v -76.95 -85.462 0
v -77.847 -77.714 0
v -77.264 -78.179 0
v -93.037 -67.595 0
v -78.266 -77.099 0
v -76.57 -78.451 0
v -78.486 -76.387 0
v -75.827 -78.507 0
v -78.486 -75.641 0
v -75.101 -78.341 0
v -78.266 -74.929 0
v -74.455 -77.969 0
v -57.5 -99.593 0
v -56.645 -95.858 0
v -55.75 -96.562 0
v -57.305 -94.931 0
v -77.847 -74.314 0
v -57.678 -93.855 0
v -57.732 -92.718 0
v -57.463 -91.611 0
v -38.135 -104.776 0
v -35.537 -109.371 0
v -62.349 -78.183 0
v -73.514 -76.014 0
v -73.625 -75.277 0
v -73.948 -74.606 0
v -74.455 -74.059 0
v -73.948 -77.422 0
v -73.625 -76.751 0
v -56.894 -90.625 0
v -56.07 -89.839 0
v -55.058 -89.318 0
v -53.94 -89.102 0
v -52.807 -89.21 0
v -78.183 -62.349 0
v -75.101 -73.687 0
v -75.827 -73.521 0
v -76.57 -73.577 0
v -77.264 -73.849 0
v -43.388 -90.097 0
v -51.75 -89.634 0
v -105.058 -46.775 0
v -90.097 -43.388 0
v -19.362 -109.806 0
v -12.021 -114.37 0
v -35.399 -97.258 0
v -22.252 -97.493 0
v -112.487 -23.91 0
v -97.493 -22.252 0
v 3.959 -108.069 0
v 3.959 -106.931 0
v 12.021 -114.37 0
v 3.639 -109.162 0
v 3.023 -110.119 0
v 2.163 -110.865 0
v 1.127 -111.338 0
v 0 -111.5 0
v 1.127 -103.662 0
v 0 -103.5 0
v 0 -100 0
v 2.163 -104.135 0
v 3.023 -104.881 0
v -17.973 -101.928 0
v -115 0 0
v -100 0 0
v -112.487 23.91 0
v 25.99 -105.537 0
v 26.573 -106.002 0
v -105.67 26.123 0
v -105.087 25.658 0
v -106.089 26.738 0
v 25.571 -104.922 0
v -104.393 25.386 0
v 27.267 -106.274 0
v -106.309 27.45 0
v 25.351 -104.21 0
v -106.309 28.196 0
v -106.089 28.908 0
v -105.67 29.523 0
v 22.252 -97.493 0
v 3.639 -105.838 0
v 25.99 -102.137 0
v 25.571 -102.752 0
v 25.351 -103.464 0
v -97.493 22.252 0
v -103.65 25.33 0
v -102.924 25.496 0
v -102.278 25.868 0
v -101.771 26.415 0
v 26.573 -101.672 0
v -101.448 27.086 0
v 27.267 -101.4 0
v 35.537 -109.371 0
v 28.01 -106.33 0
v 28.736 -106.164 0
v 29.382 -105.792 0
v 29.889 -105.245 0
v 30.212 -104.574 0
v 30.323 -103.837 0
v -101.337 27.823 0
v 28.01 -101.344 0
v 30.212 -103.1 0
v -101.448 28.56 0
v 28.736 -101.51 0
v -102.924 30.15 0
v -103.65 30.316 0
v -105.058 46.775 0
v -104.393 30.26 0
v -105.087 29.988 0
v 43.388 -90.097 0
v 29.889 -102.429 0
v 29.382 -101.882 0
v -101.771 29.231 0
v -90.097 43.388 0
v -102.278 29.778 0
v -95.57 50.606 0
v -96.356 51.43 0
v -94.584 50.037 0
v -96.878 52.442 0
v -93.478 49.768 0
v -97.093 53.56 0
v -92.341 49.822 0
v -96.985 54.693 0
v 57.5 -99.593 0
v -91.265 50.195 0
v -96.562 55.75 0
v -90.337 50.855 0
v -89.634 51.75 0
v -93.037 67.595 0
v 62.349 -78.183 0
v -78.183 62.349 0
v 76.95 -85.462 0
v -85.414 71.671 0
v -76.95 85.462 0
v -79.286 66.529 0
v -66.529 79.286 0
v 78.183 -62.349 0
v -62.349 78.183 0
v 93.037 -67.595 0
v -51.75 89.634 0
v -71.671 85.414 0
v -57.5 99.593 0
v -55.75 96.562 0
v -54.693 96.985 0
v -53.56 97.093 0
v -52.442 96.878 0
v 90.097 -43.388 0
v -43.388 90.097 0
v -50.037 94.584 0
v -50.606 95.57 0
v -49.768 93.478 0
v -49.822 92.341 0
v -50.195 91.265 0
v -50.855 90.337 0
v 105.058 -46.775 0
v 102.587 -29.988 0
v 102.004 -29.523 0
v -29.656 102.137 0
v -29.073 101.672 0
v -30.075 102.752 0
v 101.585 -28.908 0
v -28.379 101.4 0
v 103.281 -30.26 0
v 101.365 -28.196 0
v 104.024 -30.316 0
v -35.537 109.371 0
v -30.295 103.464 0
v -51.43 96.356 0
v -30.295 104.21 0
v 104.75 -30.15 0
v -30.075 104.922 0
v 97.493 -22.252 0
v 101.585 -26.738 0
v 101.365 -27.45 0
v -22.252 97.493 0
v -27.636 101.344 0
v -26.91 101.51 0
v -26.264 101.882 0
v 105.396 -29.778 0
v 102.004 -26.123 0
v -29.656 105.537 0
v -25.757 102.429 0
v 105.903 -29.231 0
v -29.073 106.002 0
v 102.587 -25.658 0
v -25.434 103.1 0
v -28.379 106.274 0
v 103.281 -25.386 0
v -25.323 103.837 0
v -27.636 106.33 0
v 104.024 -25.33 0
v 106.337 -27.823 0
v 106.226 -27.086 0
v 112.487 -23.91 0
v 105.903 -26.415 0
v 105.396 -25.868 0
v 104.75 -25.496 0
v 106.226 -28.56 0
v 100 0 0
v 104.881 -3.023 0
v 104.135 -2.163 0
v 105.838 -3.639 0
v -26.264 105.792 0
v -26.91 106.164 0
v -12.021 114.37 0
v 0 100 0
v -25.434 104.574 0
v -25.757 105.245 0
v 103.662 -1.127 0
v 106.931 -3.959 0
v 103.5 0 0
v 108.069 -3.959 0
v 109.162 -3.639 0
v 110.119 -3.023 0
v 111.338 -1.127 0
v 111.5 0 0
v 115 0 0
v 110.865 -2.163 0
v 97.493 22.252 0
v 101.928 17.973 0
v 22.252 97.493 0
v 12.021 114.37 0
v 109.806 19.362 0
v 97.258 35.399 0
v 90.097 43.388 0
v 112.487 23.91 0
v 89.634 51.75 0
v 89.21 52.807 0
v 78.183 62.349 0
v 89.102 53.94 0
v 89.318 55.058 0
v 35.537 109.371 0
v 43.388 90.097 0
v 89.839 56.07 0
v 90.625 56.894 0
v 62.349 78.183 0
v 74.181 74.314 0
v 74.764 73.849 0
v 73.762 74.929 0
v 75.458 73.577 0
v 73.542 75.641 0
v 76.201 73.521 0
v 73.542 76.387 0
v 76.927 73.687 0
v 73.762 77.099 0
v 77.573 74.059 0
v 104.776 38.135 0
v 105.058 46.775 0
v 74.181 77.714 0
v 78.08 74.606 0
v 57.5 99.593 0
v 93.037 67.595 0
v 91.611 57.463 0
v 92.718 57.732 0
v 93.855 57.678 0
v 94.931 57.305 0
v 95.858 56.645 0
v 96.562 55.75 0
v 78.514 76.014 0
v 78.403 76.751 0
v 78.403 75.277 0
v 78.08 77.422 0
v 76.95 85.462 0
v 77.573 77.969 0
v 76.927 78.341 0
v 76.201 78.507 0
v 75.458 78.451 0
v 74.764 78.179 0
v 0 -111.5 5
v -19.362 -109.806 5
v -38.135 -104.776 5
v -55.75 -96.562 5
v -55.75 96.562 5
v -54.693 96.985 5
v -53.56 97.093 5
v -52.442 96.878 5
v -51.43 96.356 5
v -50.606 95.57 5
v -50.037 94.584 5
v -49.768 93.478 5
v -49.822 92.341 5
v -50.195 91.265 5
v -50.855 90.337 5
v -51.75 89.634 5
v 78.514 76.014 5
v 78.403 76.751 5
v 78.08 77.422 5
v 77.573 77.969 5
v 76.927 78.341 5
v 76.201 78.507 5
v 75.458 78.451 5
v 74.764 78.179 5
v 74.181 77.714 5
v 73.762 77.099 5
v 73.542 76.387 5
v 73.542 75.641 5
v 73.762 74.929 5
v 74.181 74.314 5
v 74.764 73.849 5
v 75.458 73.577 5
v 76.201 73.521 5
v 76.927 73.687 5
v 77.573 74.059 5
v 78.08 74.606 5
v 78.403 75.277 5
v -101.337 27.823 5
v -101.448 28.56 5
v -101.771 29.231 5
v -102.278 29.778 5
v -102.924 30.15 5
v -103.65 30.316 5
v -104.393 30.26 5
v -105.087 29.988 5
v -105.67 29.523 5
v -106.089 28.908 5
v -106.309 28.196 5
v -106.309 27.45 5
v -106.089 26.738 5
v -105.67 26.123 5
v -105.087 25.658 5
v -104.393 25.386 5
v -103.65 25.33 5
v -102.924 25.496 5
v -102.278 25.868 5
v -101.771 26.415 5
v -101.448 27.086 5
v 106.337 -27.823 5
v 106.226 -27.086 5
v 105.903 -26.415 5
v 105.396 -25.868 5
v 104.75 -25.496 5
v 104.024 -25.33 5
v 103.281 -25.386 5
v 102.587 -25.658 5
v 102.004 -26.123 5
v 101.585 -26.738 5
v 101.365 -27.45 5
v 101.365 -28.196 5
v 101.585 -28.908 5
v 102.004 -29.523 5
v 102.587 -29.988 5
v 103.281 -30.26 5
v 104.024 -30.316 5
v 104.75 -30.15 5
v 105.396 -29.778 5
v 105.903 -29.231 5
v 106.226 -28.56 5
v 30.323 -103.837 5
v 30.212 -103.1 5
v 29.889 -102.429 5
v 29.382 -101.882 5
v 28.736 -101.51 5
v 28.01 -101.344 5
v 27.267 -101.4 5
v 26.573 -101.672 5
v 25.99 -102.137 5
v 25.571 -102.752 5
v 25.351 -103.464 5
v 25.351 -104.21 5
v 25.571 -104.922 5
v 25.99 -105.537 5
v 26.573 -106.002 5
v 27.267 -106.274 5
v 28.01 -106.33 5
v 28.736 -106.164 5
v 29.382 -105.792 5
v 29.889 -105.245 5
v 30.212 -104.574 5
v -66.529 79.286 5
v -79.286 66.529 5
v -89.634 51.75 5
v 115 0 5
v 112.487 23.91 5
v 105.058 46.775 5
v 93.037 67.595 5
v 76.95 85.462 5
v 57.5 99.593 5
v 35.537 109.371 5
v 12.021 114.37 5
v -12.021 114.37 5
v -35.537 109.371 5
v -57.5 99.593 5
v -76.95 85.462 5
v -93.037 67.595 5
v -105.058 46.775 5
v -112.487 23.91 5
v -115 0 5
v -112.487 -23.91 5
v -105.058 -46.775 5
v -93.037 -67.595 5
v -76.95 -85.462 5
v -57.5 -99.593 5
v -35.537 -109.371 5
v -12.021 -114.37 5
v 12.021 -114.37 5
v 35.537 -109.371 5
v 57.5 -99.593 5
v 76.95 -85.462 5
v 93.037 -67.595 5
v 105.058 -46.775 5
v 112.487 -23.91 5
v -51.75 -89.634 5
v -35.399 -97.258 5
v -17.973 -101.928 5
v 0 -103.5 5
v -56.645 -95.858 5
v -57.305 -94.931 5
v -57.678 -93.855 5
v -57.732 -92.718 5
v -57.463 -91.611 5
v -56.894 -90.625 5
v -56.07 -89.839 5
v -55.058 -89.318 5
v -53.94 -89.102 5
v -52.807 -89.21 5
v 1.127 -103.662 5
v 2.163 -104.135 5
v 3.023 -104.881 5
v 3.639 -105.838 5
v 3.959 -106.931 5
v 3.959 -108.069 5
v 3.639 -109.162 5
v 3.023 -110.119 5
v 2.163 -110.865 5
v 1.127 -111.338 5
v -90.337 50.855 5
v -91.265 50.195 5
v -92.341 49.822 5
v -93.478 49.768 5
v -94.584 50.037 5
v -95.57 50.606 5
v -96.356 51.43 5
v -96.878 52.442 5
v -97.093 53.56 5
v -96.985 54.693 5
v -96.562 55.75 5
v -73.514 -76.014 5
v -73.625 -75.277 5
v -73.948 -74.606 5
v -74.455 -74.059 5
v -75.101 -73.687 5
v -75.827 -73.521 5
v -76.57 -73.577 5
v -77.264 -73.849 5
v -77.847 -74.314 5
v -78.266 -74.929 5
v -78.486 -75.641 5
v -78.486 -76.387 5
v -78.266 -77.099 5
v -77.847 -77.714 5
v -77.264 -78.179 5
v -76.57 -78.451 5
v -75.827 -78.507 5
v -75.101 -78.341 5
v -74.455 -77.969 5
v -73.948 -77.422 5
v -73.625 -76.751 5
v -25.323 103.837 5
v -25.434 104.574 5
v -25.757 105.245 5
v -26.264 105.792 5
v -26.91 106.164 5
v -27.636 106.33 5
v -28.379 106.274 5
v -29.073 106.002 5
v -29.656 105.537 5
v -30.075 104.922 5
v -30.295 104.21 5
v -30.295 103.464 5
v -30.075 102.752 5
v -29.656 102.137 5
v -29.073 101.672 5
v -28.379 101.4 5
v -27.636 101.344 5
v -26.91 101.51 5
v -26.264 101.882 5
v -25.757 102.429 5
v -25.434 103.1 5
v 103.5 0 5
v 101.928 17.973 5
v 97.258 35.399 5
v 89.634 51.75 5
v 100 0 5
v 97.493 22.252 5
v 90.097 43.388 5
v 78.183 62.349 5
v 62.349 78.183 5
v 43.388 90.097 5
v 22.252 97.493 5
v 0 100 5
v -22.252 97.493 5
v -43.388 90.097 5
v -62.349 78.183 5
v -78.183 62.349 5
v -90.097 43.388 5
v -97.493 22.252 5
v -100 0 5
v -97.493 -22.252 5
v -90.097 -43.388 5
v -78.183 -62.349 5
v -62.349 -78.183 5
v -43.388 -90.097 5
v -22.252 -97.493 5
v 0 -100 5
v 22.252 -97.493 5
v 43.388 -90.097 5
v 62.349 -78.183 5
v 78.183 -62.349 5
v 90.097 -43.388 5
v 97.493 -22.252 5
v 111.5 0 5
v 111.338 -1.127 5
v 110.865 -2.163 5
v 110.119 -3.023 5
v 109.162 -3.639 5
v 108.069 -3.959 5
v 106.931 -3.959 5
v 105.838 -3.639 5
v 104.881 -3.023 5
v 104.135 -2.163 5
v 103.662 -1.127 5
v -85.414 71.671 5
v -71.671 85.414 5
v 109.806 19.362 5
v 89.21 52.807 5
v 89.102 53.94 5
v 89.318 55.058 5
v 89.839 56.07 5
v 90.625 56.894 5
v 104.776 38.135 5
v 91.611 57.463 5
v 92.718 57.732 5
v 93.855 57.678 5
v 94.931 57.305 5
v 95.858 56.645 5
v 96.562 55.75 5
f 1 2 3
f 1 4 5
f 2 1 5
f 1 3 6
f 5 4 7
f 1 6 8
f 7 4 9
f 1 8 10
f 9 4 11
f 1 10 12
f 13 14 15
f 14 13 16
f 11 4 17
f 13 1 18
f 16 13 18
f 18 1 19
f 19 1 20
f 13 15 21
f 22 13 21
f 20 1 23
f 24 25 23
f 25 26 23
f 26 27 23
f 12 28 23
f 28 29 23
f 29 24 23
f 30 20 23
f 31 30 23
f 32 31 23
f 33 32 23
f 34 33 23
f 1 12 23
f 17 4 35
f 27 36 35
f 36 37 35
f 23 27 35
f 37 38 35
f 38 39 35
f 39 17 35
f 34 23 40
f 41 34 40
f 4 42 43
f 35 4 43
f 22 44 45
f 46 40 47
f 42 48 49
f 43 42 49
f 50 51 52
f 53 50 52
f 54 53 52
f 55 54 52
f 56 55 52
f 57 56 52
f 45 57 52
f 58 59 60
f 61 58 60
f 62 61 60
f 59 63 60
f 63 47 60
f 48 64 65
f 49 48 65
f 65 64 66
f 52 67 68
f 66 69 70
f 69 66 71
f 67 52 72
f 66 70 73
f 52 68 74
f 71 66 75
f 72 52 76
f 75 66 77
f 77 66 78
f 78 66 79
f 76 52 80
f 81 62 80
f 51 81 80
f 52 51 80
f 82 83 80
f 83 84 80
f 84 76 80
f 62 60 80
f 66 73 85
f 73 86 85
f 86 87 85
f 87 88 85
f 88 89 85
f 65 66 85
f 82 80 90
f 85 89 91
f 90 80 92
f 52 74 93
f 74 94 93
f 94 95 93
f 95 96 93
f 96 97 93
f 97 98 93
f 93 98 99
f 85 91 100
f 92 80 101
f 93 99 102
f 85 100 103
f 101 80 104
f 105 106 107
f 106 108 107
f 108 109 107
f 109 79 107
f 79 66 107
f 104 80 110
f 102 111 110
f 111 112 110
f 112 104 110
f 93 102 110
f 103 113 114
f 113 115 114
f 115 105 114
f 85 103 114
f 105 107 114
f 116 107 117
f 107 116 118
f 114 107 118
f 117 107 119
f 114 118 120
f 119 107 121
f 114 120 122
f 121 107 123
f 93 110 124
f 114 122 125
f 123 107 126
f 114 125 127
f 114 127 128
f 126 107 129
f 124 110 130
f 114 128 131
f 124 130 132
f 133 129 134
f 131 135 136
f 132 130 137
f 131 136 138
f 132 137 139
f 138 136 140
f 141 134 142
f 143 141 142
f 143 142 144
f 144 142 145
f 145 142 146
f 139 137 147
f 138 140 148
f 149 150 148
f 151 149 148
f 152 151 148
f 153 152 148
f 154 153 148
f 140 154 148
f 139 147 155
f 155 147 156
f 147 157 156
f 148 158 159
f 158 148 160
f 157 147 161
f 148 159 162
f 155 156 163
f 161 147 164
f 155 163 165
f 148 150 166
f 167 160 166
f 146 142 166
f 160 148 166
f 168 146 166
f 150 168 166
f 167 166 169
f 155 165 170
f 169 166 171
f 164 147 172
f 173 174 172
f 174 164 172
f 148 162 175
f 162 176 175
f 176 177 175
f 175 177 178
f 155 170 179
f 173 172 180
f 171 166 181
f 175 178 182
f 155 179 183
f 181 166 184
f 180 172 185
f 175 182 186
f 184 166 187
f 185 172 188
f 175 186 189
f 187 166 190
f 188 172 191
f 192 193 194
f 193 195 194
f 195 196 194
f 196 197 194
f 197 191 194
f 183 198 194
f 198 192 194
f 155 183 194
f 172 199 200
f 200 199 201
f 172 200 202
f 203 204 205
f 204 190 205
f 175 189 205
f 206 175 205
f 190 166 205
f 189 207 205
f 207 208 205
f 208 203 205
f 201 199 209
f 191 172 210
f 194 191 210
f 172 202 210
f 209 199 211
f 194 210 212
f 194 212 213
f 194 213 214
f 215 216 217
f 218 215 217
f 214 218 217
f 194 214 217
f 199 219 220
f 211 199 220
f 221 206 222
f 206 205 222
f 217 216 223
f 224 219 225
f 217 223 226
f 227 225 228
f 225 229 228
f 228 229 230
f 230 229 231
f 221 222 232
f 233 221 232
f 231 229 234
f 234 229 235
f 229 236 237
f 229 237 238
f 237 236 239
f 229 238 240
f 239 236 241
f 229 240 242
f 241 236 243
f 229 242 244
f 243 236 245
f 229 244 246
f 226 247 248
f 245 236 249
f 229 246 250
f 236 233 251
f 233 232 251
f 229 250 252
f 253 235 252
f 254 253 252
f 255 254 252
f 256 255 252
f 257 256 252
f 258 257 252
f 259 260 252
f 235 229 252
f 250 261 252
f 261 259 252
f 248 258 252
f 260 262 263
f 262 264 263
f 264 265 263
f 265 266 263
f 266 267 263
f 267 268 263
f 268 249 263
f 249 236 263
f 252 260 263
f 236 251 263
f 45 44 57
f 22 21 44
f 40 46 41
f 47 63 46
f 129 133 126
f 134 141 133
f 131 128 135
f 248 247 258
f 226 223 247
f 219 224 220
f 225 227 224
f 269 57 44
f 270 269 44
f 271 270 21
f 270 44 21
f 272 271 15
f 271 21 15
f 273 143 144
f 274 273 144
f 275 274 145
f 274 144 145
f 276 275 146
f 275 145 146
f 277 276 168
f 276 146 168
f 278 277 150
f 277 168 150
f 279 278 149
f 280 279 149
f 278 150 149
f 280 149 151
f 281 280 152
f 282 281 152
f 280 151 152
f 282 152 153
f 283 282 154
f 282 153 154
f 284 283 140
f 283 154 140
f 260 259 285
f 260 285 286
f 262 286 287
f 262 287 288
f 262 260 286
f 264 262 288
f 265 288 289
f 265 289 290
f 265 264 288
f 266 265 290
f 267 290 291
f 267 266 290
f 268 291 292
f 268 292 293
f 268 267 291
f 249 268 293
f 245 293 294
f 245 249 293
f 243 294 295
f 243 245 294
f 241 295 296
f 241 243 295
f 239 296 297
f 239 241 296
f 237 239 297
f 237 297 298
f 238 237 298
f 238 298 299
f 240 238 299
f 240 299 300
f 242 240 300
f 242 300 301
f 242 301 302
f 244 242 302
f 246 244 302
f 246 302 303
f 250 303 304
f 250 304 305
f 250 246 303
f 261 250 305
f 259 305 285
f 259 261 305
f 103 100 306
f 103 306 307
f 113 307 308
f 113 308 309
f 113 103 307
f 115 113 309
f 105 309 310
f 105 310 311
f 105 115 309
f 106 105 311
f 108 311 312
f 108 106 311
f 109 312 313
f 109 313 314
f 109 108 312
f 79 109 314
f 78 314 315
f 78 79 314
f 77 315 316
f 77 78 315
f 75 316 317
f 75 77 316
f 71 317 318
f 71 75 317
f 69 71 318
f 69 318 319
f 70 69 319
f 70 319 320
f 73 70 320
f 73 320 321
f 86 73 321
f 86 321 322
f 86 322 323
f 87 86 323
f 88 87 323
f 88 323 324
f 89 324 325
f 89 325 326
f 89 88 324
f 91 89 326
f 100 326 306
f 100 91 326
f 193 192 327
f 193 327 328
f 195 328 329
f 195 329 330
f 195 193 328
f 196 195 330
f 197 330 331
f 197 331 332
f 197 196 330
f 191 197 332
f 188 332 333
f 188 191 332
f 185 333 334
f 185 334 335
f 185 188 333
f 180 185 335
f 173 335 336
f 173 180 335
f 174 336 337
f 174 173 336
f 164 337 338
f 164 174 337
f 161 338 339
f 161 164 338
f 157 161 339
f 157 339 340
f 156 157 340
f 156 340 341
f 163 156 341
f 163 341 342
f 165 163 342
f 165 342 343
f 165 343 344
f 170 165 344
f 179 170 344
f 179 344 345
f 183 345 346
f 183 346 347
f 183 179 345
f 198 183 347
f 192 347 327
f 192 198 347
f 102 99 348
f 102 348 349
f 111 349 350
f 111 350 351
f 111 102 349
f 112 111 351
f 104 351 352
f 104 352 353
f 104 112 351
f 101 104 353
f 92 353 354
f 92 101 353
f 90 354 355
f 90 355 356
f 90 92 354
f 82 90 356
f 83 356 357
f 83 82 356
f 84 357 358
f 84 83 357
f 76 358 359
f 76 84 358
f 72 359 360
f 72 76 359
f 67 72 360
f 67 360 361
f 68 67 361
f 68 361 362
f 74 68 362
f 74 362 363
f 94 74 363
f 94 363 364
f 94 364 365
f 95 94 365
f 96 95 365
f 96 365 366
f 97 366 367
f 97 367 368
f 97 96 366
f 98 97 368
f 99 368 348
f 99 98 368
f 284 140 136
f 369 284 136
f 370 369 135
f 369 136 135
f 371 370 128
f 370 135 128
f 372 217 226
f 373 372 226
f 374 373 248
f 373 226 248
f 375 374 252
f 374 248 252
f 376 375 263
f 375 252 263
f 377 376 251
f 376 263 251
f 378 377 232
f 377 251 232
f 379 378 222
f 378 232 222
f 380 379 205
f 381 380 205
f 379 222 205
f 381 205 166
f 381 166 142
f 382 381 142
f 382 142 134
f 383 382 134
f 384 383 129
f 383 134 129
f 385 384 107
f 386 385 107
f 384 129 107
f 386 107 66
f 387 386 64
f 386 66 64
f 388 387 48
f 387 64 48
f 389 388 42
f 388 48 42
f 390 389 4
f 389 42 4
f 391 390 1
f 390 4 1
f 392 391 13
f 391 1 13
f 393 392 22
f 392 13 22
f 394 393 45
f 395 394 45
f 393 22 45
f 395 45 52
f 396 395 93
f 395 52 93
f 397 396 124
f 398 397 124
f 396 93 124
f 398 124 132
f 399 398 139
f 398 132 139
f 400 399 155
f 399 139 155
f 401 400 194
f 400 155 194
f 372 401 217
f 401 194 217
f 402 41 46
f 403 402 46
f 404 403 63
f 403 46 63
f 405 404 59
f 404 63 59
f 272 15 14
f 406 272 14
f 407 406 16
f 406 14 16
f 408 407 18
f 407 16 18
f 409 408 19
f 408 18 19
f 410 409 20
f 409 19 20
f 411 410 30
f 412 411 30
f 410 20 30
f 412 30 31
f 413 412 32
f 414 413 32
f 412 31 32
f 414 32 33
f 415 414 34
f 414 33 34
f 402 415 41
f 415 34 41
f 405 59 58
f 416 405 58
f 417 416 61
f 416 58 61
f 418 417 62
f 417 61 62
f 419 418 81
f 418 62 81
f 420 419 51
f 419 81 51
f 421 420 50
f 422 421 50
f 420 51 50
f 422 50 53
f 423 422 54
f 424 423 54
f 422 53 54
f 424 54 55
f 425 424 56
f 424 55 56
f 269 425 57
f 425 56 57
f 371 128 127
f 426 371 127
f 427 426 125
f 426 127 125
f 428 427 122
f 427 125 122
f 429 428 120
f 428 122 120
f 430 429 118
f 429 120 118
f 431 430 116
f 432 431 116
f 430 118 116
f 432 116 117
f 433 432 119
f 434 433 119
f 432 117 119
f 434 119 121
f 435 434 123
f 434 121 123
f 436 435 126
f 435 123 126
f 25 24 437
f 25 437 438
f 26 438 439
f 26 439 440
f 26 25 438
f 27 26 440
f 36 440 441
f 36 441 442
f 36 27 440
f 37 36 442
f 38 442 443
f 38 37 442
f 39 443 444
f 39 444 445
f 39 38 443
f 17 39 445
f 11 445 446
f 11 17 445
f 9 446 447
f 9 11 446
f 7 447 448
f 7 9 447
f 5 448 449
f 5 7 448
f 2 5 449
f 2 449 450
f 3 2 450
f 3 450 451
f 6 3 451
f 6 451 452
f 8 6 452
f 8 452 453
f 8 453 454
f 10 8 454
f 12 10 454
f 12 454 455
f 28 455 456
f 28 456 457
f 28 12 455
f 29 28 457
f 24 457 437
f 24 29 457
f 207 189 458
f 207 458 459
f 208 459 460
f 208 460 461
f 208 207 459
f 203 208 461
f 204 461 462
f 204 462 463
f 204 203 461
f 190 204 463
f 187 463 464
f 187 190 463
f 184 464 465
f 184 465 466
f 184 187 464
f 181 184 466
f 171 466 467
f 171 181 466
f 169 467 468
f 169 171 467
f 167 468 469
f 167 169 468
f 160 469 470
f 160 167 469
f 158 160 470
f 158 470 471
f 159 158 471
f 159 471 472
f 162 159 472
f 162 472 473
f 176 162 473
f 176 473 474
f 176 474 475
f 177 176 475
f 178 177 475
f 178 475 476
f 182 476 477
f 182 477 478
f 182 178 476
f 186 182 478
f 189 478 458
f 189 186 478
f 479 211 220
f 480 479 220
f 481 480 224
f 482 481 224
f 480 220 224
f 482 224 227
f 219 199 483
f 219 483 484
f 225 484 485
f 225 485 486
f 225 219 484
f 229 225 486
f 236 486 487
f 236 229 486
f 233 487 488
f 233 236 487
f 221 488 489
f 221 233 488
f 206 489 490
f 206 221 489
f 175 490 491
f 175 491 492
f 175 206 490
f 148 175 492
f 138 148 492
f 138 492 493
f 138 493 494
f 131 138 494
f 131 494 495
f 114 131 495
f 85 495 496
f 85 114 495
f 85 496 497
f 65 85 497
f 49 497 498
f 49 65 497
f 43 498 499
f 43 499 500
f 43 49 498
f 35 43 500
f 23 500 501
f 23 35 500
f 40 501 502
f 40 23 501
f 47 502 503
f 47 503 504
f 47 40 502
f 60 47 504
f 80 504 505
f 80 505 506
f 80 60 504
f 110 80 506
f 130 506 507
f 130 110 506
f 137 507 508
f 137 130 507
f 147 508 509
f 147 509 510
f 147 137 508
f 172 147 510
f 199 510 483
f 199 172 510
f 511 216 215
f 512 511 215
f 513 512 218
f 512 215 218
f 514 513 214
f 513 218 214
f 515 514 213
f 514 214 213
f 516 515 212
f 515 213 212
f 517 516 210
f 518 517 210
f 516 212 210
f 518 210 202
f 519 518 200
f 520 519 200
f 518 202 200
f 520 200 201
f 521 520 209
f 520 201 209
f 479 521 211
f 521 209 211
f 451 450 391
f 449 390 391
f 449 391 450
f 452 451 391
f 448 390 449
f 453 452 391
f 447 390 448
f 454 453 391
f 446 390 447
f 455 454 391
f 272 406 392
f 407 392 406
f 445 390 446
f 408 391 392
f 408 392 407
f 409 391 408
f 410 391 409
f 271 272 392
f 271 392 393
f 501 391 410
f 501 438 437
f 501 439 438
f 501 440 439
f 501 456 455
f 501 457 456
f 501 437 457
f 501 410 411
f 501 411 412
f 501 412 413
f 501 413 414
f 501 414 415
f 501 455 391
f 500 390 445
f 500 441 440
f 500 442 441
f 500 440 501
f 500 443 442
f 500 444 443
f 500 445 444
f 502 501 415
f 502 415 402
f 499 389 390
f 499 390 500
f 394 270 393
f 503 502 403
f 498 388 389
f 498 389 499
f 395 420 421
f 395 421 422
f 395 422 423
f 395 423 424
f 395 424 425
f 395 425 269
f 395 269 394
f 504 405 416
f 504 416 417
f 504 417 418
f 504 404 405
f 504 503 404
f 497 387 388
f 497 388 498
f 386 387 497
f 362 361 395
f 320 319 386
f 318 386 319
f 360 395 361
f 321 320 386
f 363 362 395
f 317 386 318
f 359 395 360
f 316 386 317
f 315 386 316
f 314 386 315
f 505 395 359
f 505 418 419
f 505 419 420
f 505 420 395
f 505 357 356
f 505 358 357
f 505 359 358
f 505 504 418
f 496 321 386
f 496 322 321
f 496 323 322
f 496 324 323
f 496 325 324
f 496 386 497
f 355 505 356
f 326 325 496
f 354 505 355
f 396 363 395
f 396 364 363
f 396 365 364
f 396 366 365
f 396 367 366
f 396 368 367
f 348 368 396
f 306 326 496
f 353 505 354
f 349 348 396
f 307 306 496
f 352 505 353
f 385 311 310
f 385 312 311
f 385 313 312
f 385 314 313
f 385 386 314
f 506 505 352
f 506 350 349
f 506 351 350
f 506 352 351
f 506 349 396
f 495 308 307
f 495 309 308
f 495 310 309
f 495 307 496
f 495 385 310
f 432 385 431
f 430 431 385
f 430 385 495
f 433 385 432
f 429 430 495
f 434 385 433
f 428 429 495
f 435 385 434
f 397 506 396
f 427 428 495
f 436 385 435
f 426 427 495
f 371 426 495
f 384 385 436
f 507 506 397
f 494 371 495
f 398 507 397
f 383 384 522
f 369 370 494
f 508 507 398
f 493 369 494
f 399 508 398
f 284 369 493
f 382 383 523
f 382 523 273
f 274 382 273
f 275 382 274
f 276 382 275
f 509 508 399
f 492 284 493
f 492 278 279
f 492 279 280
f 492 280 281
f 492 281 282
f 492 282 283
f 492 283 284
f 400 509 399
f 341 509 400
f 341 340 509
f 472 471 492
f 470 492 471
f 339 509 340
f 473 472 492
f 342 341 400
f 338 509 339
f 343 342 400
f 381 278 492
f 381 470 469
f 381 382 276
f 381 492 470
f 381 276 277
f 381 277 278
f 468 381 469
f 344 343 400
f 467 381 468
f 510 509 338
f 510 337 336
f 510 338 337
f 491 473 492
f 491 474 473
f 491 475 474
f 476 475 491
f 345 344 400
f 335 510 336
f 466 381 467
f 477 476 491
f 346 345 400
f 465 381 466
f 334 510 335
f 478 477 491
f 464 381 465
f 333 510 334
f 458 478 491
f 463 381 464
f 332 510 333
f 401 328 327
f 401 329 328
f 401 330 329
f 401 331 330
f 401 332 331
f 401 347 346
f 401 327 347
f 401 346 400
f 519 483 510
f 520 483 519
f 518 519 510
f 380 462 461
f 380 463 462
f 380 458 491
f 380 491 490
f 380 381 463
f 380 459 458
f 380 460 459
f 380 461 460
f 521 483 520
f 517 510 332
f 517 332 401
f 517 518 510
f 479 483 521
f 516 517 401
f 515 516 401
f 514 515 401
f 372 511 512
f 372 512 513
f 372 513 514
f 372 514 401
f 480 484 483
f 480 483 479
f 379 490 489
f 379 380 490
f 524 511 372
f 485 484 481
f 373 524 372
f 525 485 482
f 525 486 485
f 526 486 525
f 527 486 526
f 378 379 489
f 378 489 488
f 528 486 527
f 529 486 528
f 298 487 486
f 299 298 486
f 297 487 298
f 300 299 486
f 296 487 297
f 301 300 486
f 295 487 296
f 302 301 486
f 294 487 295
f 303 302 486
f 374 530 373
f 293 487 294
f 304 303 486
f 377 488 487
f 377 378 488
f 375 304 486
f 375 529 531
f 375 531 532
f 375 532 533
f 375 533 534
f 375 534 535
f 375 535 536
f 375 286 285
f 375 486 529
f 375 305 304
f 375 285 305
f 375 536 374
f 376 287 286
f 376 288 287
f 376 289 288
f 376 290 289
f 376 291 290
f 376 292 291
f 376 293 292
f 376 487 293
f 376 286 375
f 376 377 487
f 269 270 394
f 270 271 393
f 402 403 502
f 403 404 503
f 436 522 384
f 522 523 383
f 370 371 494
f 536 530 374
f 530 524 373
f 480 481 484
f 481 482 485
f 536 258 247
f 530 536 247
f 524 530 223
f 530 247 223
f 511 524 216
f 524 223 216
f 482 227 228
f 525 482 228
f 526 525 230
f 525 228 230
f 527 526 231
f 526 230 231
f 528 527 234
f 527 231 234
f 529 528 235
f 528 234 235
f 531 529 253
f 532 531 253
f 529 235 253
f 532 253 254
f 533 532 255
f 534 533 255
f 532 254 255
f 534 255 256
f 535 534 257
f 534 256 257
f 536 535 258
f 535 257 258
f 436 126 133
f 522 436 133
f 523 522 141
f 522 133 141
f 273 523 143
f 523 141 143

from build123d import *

# Parameters (mm, degrees)
F0_R     = 115
F0_R_2   = 2.5
F0_R_3   = 100
F1_DEPTH = 5


with BuildPart() as f1:
    # F0 (on Top) → F1 (new body)
    with BuildSketch(Plane.XY):
        Circle(F0_R)
        with Locations((-76.013979, -76.013979)):
            Circle(F0_R_2, mode=Mode.SUBTRACT)
        with BuildLine():
            ThreePointArc((0, -111.5), (-28.858324, -107.70073), (-55.75, -96.561833))
            ThreePointArc((-55.75, -96.561833), (-57.214102, -91.097731), (-51.75, -89.633629))
            ThreePointArc((-51.75, -89.633629), (-26.787771, -99.973323), (0, -103.5))
            ThreePointArc((0, -103.5), (4, -107.5), (0, -111.5))
        make_face(mode=Mode.SUBTRACT)
        with Locations((27.823047, -103.837026)):
            Circle(F0_R_2, mode=Mode.SUBTRACT)
        with Locations((103.837026, -27.823047)):
            Circle(F0_R_2, mode=Mode.SUBTRACT)
        with Locations((-103.837026, 27.823047)):
            Circle(F0_R_2, mode=Mode.SUBTRACT)
        with BuildLine():
            ThreePointArc((-96.561833, 55.75), (-78.842406, 78.842406), (-55.75, 96.561833))
            ThreePointArc((-55.75, 96.561833), (-50.285898, 95.097731), (-51.75, 89.633629))
            ThreePointArc((-51.75, 89.633629), (-73.185552, 73.185552), (-89.633629, 51.75))
            ThreePointArc((-89.633629, 51.75), (-95.097731, 50.285898), (-96.561833, 55.75))
        make_face(mode=Mode.SUBTRACT)
        with Locations((-27.823047, 103.837026)):
            Circle(F0_R_2, mode=Mode.SUBTRACT)
        Circle(F0_R_3, mode=Mode.SUBTRACT)
        with BuildLine():
            ThreePointArc((111.5, 0), (107.5, -4), (103.5, 0))
            ThreePointArc((103.5, 0), (99.973323, 26.787771), (89.633629, 51.75))
            ThreePointArc((89.633629, 51.75), (91.097731, 57.214102), (96.561833, 55.75))
            ThreePointArc((96.561833, 55.75), (107.70073, 28.858324), (111.5, 0))
        make_face(mode=Mode.SUBTRACT)
        with Locations((76.013979, 76.013979)):
            Circle(F0_R_2, mode=Mode.SUBTRACT)
    extrude(amount=F1_DEPTH)


solid = f1.part
